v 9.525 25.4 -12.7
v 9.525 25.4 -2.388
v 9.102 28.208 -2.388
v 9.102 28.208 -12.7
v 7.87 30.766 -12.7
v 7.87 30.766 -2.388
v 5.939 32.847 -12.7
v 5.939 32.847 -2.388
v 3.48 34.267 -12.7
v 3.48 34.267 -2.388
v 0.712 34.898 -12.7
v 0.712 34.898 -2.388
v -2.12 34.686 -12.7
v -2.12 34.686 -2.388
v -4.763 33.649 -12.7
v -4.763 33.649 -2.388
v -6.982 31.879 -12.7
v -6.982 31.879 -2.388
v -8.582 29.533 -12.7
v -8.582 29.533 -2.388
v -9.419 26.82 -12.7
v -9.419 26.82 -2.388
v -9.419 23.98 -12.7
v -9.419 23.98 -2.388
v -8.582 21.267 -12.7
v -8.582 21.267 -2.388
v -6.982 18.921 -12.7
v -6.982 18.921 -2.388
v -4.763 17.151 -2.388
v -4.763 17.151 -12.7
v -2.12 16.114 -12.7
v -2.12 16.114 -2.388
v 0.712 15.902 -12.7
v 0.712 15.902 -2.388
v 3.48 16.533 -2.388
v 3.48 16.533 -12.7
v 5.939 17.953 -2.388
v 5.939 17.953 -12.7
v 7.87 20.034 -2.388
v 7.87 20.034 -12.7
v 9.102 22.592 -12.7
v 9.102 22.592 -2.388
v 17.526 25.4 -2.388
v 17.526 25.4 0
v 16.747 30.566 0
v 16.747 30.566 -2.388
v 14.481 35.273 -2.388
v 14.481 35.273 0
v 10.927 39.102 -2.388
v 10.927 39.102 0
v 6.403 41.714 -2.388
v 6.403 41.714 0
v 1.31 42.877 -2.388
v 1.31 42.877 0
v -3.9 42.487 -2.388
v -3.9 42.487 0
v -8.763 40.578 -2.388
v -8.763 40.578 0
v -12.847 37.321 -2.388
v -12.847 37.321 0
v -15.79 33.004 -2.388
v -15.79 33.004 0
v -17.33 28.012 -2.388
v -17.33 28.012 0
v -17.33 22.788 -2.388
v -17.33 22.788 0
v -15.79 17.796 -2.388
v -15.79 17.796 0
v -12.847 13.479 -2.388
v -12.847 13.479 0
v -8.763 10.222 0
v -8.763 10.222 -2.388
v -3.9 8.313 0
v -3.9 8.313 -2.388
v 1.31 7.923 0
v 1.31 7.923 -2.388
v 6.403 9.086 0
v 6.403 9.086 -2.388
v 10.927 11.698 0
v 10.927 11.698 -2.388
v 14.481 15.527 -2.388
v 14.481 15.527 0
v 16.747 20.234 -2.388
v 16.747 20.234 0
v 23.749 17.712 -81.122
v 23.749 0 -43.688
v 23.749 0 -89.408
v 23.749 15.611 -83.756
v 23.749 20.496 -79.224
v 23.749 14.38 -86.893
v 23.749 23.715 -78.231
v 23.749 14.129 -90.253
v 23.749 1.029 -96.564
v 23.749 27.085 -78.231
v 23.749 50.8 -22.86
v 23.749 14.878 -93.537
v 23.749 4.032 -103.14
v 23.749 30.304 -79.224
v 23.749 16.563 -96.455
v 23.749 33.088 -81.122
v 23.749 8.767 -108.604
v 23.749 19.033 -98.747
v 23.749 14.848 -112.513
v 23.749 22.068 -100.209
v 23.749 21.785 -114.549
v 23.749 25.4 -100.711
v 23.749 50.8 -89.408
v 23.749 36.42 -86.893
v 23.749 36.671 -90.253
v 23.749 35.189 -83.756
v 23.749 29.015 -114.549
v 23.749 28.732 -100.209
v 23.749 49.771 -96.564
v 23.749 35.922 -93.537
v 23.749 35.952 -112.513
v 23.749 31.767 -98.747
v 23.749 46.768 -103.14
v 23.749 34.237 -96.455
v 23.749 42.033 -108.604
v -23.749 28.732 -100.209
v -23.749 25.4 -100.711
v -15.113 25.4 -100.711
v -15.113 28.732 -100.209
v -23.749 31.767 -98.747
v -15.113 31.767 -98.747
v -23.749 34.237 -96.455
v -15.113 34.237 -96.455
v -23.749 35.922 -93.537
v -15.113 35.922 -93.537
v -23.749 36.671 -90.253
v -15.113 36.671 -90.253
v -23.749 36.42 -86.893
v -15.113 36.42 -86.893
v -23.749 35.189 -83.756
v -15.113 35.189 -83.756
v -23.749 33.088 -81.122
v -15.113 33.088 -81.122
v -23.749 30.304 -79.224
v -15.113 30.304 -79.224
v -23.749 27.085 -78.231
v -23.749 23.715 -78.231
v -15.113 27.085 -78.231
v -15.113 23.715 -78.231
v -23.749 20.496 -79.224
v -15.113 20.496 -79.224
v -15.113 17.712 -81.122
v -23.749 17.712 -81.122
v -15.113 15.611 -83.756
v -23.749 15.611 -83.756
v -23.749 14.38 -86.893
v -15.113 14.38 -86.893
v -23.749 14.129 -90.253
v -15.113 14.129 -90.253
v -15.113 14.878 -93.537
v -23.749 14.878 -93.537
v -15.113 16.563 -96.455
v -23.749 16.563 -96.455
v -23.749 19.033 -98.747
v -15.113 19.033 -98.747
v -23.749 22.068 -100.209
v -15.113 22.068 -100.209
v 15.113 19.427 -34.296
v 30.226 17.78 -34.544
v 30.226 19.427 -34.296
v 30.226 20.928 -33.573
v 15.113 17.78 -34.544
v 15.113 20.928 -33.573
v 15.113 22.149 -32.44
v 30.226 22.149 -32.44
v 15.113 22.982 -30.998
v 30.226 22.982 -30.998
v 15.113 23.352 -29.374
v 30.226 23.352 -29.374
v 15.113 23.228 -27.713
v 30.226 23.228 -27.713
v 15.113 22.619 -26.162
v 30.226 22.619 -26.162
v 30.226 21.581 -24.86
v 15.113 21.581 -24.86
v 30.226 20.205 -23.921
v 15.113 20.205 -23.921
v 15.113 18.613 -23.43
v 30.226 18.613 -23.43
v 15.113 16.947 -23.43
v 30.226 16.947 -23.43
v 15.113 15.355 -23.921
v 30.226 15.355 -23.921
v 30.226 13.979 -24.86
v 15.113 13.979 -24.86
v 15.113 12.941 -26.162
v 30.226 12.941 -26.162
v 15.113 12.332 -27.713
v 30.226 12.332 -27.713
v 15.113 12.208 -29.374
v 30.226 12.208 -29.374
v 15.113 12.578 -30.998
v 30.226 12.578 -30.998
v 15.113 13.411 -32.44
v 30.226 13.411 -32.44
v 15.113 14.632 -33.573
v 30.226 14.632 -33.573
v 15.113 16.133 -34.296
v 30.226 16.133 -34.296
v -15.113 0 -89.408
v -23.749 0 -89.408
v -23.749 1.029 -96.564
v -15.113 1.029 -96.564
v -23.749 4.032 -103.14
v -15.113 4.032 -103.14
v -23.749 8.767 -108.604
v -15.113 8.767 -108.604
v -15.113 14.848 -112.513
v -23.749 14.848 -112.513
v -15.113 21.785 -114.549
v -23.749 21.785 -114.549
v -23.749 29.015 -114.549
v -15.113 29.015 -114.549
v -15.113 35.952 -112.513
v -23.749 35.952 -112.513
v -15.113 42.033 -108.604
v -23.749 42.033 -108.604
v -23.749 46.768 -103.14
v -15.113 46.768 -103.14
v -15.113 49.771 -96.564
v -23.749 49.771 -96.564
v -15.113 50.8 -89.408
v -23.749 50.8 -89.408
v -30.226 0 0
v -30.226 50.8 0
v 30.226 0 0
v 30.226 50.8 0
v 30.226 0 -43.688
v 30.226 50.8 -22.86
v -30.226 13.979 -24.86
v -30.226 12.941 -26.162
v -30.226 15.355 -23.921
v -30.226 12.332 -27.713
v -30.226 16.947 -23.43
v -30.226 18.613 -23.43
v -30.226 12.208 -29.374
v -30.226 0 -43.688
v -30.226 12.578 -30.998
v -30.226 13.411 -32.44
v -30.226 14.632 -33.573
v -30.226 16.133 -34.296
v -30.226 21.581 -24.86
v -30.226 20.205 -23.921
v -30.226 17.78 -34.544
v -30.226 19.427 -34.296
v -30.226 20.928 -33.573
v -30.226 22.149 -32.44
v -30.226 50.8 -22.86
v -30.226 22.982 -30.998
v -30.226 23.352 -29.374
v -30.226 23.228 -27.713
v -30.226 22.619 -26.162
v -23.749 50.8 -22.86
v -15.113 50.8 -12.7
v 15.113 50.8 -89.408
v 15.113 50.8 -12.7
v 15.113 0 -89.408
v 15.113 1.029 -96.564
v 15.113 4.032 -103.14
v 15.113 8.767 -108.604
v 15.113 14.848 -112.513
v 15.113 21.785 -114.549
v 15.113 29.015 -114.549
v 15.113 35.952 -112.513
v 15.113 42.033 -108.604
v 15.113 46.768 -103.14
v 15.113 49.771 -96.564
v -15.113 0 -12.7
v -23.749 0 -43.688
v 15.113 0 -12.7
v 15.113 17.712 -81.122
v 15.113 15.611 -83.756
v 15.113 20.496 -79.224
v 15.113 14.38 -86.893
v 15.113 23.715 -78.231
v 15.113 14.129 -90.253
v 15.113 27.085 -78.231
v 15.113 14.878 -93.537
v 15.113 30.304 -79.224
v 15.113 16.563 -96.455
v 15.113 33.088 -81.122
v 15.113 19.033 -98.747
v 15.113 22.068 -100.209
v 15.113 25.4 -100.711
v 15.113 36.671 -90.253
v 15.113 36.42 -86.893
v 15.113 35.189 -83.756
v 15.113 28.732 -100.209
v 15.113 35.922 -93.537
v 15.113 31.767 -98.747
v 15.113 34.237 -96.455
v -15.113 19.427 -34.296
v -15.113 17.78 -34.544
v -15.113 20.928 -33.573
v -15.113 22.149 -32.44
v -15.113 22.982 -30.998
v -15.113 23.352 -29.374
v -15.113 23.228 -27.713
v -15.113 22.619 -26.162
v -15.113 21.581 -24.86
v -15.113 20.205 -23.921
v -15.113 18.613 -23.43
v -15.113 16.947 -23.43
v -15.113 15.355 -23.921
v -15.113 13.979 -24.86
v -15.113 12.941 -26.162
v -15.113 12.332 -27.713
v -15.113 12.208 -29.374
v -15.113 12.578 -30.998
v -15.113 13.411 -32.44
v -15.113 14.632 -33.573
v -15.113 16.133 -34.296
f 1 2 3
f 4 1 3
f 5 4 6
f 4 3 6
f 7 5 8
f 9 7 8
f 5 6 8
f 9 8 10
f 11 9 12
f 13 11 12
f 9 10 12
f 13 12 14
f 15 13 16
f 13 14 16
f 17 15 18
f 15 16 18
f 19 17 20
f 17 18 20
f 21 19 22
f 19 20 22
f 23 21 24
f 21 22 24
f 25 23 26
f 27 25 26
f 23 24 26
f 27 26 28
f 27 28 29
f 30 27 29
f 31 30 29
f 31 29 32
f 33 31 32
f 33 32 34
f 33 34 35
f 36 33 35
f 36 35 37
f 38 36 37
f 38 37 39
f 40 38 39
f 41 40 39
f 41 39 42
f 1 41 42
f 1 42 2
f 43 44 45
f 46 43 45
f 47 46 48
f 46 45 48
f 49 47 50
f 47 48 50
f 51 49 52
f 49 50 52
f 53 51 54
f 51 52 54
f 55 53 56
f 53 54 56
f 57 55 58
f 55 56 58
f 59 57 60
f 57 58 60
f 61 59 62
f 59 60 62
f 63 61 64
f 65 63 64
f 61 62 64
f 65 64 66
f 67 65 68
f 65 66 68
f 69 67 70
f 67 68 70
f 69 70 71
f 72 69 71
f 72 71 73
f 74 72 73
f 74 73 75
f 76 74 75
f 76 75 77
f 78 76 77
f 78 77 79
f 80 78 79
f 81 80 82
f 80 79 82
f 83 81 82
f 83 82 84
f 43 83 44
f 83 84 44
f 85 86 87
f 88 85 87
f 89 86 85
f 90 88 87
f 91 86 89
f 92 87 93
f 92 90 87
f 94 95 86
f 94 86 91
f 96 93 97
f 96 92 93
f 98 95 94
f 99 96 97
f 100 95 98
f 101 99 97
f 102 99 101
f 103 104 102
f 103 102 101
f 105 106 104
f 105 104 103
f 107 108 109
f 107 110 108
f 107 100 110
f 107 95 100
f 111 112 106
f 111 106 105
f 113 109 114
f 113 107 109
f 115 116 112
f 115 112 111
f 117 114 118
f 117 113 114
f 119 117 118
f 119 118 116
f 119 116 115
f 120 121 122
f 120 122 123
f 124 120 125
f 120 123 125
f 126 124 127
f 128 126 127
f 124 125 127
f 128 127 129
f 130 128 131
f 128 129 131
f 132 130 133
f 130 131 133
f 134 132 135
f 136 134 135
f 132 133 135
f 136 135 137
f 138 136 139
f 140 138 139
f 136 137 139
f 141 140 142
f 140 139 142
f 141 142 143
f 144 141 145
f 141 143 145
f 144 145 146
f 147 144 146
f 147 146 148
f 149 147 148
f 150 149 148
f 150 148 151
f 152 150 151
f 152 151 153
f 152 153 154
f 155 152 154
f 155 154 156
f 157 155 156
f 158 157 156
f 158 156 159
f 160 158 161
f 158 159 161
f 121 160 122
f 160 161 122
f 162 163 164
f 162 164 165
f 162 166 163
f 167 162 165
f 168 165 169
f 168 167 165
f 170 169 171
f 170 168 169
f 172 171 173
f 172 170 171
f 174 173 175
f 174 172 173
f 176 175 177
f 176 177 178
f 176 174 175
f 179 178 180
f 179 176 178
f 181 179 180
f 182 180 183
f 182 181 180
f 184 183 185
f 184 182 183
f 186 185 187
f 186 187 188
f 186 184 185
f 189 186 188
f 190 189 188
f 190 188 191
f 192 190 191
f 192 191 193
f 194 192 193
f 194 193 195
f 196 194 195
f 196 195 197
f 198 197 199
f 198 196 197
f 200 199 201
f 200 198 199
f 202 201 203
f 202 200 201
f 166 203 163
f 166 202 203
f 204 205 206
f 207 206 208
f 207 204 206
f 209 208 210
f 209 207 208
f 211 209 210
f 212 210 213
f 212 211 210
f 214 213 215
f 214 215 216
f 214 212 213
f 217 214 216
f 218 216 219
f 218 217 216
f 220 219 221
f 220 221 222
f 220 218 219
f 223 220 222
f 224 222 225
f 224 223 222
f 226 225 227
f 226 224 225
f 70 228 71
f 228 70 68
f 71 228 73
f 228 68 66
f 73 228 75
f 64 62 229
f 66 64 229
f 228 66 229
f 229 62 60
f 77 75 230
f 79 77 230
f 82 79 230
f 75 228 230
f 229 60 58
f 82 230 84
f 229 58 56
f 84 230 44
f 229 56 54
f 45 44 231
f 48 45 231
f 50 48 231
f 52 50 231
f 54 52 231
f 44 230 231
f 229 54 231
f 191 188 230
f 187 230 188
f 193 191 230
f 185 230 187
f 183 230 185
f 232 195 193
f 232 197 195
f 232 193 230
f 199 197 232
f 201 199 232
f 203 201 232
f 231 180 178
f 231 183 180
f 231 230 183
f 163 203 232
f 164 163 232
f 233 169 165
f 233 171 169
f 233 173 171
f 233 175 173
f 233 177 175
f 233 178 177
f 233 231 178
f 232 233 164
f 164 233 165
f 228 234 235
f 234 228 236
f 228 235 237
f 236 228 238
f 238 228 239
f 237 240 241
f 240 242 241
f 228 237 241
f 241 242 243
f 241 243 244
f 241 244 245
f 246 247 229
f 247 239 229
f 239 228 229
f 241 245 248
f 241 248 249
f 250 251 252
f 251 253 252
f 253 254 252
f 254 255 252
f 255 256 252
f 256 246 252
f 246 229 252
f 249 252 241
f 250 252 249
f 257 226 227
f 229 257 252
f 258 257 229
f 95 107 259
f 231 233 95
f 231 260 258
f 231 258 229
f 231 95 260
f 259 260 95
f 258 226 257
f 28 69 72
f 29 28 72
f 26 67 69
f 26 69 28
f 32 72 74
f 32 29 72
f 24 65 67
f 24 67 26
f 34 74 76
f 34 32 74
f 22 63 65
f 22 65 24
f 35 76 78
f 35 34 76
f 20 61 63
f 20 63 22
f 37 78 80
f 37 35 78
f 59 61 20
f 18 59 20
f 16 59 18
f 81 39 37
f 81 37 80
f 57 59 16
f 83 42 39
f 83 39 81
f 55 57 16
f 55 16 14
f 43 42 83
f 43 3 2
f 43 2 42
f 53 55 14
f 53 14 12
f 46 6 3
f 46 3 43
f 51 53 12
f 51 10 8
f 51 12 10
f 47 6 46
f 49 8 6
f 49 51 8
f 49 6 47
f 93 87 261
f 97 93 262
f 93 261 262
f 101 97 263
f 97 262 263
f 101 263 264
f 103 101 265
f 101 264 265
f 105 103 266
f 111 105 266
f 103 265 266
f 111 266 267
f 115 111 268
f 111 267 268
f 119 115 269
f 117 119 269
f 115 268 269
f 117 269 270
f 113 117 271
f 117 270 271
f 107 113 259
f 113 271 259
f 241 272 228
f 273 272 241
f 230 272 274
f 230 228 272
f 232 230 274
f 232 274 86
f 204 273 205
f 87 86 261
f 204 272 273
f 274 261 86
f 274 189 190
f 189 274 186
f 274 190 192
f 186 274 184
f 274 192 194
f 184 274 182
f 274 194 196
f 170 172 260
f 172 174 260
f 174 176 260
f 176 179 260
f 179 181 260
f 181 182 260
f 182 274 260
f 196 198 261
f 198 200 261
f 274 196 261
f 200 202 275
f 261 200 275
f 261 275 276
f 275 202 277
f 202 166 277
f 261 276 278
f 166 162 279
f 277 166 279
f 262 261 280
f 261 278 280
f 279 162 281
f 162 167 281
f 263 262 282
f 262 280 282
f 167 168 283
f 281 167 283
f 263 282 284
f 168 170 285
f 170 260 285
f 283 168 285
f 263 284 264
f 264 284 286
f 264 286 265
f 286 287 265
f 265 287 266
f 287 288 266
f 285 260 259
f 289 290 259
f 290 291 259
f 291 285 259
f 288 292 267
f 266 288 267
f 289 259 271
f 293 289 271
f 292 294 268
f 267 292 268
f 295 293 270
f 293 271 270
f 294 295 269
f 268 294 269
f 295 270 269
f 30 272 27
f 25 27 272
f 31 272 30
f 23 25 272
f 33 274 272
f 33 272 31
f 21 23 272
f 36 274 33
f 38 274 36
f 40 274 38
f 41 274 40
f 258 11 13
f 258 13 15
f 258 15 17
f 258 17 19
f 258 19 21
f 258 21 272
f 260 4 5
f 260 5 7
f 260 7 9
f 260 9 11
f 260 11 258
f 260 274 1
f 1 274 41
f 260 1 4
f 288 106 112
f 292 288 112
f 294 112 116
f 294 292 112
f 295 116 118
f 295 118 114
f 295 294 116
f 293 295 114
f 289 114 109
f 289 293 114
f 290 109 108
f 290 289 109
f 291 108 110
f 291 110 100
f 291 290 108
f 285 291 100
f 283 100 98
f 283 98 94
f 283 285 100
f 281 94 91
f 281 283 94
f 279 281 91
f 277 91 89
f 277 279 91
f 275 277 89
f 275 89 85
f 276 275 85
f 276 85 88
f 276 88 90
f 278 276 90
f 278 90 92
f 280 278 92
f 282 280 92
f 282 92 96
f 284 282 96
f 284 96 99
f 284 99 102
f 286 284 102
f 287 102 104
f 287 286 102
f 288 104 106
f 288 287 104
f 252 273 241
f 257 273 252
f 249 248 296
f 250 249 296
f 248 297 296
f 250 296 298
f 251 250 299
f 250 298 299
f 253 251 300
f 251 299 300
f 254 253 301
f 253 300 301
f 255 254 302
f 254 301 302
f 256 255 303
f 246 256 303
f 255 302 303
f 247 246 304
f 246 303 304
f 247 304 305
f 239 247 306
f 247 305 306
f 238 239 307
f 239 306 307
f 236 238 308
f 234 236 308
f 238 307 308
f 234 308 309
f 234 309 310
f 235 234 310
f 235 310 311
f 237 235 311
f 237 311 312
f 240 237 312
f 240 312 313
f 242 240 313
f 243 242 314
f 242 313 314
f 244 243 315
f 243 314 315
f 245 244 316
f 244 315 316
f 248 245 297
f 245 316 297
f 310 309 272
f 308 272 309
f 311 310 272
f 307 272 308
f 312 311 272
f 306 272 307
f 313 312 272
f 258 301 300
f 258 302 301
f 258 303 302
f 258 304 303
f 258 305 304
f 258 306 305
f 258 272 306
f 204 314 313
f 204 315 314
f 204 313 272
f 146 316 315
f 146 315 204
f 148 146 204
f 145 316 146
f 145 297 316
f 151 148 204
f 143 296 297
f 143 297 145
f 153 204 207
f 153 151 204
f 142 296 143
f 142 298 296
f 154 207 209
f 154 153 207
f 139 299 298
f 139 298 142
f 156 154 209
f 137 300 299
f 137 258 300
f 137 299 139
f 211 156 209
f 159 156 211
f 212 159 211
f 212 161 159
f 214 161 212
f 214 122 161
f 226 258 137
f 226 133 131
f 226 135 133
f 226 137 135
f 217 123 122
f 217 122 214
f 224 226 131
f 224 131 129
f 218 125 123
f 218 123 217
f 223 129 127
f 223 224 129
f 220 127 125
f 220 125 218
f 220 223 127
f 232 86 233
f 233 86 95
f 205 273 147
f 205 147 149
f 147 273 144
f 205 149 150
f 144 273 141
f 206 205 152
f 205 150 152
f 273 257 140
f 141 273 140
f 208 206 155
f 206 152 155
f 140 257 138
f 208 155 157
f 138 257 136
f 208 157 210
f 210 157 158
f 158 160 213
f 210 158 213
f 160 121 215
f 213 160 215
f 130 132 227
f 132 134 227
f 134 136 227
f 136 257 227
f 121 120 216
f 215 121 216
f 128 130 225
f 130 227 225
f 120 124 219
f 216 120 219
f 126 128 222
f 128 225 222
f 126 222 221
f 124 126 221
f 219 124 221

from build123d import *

# Parameters (mm, degrees)
SKETCH1_W           = 12.7
SKETCH1_H           = 50.8
BOSS_EXTRUDE1_DEPTH = 15.113
BOSS_EXTRUDE2_START = 15.113
SKETCH1_3_R         = 5.588
SKETCH1_3_R_2       = 11.303
BOSS_EXTRUDE2_DEPTH = 8.636
BOSS_EXTRUDE3_START = 23.749
SKETCH1_4_R         = 5.588
BOSS_EXTRUDE3_DEPTH = 6.477
SKETCH2_R           = 9.525
CUT_EXTRUDE1_DEPTH  = 130.132211086
SKETCH3_R           = 17.526
CUT_EXTRUDE2_DEPTH  = 2.3876


with BuildPart() as part:
    # Sketch1 → Boss-Extrude1 (new body)
    with BuildSketch(Plane(origin=(0, 0, 0), x_dir=(0, 0, -1), z_dir=(1, 0, 0))):
        with Locations((6.35, 25.4)):
            Rectangle(SKETCH1_W, SKETCH1_H)
    boss_extrude1 = extrude(amount=BOSS_EXTRUDE1_DEPTH)

    # Sketch1<3> → Boss-Extrude2 (add)
    with BuildSketch(Plane(origin=(0, 0, 0), x_dir=(0, 0, -1), z_dir=(1, 0, 0)).offset(BOSS_EXTRUDE2_START)):
        with BuildLine():
            Line((0, 50.8), (0, 0))
            Line((0, 0), (89.408, 0))
            ThreePointArc((89.408, 0), (114.808, 25.4), (89.408, 50.8))
            Line((89.408, 50.8), (0, 50.8))
        make_face()
        with Locations((28.956, 17.78)):
            Circle(SKETCH1_3_R, mode=Mode.SUBTRACT)
        with Locations((89.408, 25.4)):
            Circle(SKETCH1_3_R_2, mode=Mode.SUBTRACT)
    boss_extrude2 = extrude(amount=BOSS_EXTRUDE2_DEPTH)

    # Sketch1<4> → Boss-Extrude3 (add)
    with BuildSketch(Plane(origin=(0, 0, 0), x_dir=(0, 0, -1), z_dir=(1, 0, 0)).offset(BOSS_EXTRUDE3_START)):
        Polygon((0, 50.8), (0, 0), (43.688, 0), (22.86, 50.8), align=None)
        with Locations((28.956, 17.78)):
            Circle(SKETCH1_4_R, mode=Mode.SUBTRACT)
    boss_extrude3 = extrude(amount=BOSS_EXTRUDE3_DEPTH)

    # Mirror1: Boss-Extrude1, Boss-Extrude2, Boss-Extrude3 across plane
    add(boss_extrude1.mirror(Plane(origin=(0, 0, 0), x_dir=(0, 0, 1), z_dir=(1, 0, 0))))
    add(boss_extrude2.mirror(Plane(origin=(0, 0, 0), x_dir=(0, 0, 1), z_dir=(1, 0, 0))))
    add(boss_extrude3.mirror(Plane(origin=(0, 0, 0), x_dir=(0, 0, 1), z_dir=(1, 0, 0))))

    # Sketch2 → Cut-Extrude1 (cut, through all)
    with BuildSketch(Plane.XY):
        with Locations((0, 25.4)):
            Circle(SKETCH2_R)
    extrude(amount=-CUT_EXTRUDE1_DEPTH, mode=Mode.SUBTRACT)

    # Sketch3 → Cut-Extrude2 (cut)
    with BuildSketch(Plane.XY):
        with Locations((0, 25.4)):
            Circle(SKETCH3_R)
    extrude(amount=-CUT_EXTRUDE2_DEPTH, mode=Mode.SUBTRACT)


solid = part.part
